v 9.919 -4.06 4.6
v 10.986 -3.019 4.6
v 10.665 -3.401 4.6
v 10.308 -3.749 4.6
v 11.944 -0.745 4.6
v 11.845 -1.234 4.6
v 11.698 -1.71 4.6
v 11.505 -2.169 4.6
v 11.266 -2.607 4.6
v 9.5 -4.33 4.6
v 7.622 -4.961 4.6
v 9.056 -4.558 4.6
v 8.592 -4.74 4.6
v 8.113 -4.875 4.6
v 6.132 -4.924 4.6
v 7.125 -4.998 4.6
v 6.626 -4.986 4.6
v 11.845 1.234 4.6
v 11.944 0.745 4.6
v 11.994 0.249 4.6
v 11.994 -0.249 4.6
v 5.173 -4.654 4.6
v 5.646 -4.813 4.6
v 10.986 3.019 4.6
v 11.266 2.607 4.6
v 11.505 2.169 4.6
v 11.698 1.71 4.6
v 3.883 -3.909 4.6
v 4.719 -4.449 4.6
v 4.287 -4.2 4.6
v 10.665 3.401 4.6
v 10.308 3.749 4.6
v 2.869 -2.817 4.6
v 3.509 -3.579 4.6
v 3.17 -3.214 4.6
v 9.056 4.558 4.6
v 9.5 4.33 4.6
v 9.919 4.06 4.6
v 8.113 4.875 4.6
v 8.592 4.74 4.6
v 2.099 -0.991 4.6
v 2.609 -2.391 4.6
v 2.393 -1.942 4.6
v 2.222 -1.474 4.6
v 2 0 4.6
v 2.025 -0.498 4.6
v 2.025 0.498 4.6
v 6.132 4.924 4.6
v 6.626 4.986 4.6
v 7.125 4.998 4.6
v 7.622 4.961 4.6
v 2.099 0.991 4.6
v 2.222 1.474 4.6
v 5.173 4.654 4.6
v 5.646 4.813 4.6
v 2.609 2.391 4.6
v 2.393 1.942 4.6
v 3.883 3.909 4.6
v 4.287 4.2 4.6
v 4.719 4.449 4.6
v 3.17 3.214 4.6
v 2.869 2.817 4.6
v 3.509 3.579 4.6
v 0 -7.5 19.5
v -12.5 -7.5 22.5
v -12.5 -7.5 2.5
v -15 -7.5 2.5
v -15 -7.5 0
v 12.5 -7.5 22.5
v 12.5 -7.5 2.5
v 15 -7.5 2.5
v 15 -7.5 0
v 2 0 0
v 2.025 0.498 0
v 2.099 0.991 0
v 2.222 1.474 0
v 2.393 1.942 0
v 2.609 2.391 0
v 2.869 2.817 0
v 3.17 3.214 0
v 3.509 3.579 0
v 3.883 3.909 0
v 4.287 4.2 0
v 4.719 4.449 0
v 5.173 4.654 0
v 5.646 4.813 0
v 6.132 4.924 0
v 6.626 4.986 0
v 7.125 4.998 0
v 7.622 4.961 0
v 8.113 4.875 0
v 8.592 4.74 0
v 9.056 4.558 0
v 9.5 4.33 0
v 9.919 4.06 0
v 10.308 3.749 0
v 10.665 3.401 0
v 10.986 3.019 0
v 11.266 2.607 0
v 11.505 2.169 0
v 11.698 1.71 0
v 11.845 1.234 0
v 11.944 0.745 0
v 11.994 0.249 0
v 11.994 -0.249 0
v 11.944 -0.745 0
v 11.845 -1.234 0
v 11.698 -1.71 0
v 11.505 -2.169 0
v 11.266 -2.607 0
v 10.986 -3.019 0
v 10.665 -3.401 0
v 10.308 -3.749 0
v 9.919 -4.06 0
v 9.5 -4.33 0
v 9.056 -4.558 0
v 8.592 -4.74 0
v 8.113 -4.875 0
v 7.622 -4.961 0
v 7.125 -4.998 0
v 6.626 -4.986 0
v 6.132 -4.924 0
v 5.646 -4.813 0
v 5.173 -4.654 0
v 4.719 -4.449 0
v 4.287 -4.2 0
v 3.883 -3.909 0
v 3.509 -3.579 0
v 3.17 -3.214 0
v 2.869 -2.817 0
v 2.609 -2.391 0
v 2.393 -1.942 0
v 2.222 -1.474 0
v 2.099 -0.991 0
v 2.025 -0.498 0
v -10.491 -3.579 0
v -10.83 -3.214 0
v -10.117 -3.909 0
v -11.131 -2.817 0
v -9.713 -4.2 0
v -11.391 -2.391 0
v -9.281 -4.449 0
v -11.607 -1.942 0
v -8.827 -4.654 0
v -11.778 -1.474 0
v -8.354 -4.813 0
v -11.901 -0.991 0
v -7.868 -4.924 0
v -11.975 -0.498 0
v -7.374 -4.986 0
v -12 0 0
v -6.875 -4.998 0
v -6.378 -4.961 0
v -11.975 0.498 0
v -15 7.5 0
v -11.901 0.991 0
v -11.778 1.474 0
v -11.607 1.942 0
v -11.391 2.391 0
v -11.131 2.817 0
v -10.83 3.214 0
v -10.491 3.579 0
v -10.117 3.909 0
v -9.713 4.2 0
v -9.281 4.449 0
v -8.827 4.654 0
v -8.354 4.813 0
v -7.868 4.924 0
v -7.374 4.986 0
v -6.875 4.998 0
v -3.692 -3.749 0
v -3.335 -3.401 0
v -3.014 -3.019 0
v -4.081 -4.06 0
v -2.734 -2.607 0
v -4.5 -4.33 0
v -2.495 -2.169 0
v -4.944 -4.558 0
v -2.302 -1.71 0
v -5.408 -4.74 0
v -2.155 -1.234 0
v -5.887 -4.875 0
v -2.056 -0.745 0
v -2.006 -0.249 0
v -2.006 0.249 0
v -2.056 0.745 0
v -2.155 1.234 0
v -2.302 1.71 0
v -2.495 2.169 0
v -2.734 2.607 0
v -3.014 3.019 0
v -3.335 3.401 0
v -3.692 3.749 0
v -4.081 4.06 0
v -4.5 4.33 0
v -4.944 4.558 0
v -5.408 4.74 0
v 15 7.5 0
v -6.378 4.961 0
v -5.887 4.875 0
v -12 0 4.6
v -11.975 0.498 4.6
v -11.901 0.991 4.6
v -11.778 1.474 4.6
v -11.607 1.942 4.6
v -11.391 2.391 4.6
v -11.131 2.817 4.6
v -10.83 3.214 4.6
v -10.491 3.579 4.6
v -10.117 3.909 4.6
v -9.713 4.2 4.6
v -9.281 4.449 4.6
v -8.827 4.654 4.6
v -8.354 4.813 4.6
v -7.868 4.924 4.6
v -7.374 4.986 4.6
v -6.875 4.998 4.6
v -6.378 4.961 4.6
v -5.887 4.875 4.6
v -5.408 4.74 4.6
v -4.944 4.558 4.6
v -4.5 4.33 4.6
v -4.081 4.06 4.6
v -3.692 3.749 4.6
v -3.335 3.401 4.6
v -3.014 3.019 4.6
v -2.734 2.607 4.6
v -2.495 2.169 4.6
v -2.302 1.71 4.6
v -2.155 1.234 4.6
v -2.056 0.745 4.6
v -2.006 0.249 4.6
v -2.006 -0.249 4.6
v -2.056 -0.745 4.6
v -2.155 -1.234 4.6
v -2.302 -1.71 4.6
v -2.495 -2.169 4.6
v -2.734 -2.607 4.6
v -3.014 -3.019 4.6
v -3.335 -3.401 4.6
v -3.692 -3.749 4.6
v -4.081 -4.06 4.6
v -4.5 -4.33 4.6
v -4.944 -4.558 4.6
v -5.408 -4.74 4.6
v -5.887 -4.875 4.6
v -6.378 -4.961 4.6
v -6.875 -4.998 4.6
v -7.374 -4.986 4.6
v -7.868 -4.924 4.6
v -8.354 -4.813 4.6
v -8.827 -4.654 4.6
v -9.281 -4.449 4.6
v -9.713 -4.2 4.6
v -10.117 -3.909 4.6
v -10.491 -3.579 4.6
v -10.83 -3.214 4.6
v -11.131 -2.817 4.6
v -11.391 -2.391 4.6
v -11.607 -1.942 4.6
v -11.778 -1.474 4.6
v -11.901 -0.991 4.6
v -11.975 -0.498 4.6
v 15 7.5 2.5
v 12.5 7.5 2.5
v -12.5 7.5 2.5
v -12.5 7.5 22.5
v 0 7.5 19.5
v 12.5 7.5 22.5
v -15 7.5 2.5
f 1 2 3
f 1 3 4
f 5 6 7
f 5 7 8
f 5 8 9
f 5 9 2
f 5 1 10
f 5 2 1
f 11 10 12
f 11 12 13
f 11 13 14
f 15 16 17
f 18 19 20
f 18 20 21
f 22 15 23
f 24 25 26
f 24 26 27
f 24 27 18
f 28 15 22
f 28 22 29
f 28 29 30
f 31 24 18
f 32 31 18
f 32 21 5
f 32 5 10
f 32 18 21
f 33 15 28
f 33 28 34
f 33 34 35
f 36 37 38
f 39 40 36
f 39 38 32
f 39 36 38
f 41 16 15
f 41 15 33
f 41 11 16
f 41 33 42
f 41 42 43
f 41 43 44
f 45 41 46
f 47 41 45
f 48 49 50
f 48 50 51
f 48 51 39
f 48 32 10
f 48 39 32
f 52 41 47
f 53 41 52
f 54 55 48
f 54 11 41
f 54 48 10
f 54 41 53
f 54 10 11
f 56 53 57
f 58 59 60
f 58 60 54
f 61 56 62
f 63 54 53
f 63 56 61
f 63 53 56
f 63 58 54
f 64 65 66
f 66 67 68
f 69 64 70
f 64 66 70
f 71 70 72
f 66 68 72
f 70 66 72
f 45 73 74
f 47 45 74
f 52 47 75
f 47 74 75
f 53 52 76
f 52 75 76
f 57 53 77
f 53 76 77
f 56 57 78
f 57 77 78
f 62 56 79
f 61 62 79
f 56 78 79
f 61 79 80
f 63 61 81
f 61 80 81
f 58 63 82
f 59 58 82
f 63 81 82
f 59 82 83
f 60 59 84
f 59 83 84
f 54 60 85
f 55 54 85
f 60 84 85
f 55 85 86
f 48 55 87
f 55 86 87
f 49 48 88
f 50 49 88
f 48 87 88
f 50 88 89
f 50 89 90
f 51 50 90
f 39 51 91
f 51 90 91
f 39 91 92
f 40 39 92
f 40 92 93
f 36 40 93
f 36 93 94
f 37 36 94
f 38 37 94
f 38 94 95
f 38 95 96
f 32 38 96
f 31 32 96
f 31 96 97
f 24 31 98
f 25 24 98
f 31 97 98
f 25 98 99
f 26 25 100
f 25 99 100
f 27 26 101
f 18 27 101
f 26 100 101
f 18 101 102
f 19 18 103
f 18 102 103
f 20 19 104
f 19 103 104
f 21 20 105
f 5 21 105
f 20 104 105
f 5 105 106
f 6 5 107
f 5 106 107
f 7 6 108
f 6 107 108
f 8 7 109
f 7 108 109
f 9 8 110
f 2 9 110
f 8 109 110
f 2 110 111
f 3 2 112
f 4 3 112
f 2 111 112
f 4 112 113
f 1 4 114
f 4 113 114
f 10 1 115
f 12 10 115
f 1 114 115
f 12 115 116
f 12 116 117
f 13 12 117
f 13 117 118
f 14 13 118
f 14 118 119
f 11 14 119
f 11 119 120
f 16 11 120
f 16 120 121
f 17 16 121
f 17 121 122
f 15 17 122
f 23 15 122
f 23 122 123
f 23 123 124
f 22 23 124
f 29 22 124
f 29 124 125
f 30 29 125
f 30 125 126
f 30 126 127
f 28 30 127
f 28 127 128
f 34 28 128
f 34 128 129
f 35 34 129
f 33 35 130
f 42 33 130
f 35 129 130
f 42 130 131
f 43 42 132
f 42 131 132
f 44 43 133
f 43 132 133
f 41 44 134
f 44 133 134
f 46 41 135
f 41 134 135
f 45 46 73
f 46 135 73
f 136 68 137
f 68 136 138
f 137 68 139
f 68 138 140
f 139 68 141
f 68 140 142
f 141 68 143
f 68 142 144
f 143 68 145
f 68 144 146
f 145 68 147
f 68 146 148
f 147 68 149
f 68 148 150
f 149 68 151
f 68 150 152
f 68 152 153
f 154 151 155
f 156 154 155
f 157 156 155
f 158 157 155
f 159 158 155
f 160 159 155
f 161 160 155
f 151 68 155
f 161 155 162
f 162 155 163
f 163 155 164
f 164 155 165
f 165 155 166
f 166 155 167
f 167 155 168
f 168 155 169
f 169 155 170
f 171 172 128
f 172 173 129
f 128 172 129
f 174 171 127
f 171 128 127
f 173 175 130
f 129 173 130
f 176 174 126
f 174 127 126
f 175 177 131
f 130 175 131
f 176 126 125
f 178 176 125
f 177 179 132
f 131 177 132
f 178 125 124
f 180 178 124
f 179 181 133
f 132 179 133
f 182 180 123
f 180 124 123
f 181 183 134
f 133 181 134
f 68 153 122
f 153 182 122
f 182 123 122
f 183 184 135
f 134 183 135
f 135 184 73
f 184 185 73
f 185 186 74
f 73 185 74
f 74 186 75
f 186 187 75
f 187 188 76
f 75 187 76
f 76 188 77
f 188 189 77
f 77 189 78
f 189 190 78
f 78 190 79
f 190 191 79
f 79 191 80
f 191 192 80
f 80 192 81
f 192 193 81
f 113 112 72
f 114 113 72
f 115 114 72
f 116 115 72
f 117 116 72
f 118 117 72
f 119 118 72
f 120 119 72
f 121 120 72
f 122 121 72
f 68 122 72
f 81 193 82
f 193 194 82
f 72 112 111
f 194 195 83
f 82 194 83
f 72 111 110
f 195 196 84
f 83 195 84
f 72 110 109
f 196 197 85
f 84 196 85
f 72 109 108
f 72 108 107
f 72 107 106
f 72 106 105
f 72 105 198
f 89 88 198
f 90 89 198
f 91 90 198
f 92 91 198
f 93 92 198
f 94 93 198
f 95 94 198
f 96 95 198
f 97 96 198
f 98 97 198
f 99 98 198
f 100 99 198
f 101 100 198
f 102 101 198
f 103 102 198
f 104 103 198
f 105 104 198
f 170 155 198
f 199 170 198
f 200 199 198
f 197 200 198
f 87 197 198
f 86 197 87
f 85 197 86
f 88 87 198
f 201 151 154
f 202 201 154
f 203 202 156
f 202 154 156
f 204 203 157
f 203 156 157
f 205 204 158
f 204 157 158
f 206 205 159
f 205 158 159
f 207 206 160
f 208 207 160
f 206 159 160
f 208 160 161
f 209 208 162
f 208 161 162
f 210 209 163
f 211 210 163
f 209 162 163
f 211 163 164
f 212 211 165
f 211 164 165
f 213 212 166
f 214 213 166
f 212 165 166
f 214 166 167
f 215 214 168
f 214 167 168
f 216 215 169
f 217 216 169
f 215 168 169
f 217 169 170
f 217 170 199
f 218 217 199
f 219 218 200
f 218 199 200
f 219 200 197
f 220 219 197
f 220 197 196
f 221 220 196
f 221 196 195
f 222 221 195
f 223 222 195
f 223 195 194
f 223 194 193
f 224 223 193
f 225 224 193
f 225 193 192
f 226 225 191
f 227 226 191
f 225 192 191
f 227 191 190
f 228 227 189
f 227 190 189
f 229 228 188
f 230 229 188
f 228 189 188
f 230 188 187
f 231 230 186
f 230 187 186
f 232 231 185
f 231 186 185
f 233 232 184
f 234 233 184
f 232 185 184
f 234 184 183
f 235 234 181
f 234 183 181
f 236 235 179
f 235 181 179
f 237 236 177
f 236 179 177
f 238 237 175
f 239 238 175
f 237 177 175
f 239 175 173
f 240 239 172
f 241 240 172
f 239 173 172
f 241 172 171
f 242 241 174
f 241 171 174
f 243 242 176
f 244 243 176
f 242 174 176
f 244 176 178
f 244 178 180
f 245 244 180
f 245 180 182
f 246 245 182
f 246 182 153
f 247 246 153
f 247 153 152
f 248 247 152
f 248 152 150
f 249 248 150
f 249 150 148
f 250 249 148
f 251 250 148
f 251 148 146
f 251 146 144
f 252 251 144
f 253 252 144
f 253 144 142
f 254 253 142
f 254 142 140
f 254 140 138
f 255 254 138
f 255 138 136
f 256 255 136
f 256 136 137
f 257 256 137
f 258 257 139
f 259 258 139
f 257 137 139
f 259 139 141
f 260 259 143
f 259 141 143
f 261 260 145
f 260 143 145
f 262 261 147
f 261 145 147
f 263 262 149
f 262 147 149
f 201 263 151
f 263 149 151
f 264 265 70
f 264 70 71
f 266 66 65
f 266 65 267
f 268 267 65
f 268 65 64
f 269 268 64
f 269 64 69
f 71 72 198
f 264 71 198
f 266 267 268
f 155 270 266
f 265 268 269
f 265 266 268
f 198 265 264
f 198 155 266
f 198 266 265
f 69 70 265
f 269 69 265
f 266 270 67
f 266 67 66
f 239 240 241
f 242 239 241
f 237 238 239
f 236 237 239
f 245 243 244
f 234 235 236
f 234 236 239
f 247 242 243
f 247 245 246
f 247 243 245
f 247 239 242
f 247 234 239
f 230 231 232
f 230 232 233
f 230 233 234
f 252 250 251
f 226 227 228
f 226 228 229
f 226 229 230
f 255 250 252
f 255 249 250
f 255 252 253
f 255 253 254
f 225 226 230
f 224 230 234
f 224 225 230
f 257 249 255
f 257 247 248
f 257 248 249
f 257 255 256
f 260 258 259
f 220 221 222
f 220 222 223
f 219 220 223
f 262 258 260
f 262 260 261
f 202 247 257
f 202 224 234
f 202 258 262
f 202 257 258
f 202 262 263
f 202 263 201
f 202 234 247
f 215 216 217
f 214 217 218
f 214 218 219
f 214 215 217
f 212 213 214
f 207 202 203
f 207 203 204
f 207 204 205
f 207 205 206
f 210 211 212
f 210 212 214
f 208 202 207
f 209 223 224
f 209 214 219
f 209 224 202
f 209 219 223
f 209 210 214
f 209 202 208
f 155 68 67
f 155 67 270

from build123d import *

# Parameters (mm, degrees)
CROQUIS1_W              = 30
CROQUIS1_H              = 15
SALIENTE_EXTRUIR1_DEPTH = 2.5
CROQUIS2_W              = 25
CROQUIS2_H              = 15
SALIENTE_EXTRUIR2_DEPTH = 20
CORTAR_EXTRUIR1_DEPTH   = 20
CROQUIS5_R              = 5
CORTAR_EXTRUIR3_DEPTH   = 4.6


with BuildPart() as part:
    # Croquis1 → Saliente-Extruir1 (new body)
    with BuildSketch(Plane.XY):
        Rectangle(CROQUIS1_W, CROQUIS1_H)
    extrude(amount=SALIENTE_EXTRUIR1_DEPTH)

    # Croquis2 → Saliente-Extruir2 (add)
    with BuildSketch(Plane.XY.offset(2.5)):
        Rectangle(CROQUIS2_W, CROQUIS2_H)
    extrude(amount=SALIENTE_EXTRUIR2_DEPTH)

    # Croquis4 → Cortar-Extruir1 (cut)
    with BuildSketch(Plane(origin=(0, 7.5, 0), x_dir=(1, 0, 0), z_dir=(0, 1, 0))):
        Polygon((-12.5, -22.5), (0, -19.5), (12.5, -22.5), align=None)
    extrude(amount=-CORTAR_EXTRUIR1_DEPTH, mode=Mode.SUBTRACT)

    # Croquis5 → Cortar-Extruir3 (cut)
    with BuildSketch(Plane(origin=(0, 0, 0), x_dir=(-1, 0, 0), z_dir=(0, 0, -1))):
        with Locations((-7, 0)):
            Circle(CROQUIS5_R)
        with Locations((7, 0)):
            Circle(CROQUIS5_R)
    extrude(amount=-CORTAR_EXTRUIR3_DEPTH, mode=Mode.SUBTRACT)


solid = part.part
